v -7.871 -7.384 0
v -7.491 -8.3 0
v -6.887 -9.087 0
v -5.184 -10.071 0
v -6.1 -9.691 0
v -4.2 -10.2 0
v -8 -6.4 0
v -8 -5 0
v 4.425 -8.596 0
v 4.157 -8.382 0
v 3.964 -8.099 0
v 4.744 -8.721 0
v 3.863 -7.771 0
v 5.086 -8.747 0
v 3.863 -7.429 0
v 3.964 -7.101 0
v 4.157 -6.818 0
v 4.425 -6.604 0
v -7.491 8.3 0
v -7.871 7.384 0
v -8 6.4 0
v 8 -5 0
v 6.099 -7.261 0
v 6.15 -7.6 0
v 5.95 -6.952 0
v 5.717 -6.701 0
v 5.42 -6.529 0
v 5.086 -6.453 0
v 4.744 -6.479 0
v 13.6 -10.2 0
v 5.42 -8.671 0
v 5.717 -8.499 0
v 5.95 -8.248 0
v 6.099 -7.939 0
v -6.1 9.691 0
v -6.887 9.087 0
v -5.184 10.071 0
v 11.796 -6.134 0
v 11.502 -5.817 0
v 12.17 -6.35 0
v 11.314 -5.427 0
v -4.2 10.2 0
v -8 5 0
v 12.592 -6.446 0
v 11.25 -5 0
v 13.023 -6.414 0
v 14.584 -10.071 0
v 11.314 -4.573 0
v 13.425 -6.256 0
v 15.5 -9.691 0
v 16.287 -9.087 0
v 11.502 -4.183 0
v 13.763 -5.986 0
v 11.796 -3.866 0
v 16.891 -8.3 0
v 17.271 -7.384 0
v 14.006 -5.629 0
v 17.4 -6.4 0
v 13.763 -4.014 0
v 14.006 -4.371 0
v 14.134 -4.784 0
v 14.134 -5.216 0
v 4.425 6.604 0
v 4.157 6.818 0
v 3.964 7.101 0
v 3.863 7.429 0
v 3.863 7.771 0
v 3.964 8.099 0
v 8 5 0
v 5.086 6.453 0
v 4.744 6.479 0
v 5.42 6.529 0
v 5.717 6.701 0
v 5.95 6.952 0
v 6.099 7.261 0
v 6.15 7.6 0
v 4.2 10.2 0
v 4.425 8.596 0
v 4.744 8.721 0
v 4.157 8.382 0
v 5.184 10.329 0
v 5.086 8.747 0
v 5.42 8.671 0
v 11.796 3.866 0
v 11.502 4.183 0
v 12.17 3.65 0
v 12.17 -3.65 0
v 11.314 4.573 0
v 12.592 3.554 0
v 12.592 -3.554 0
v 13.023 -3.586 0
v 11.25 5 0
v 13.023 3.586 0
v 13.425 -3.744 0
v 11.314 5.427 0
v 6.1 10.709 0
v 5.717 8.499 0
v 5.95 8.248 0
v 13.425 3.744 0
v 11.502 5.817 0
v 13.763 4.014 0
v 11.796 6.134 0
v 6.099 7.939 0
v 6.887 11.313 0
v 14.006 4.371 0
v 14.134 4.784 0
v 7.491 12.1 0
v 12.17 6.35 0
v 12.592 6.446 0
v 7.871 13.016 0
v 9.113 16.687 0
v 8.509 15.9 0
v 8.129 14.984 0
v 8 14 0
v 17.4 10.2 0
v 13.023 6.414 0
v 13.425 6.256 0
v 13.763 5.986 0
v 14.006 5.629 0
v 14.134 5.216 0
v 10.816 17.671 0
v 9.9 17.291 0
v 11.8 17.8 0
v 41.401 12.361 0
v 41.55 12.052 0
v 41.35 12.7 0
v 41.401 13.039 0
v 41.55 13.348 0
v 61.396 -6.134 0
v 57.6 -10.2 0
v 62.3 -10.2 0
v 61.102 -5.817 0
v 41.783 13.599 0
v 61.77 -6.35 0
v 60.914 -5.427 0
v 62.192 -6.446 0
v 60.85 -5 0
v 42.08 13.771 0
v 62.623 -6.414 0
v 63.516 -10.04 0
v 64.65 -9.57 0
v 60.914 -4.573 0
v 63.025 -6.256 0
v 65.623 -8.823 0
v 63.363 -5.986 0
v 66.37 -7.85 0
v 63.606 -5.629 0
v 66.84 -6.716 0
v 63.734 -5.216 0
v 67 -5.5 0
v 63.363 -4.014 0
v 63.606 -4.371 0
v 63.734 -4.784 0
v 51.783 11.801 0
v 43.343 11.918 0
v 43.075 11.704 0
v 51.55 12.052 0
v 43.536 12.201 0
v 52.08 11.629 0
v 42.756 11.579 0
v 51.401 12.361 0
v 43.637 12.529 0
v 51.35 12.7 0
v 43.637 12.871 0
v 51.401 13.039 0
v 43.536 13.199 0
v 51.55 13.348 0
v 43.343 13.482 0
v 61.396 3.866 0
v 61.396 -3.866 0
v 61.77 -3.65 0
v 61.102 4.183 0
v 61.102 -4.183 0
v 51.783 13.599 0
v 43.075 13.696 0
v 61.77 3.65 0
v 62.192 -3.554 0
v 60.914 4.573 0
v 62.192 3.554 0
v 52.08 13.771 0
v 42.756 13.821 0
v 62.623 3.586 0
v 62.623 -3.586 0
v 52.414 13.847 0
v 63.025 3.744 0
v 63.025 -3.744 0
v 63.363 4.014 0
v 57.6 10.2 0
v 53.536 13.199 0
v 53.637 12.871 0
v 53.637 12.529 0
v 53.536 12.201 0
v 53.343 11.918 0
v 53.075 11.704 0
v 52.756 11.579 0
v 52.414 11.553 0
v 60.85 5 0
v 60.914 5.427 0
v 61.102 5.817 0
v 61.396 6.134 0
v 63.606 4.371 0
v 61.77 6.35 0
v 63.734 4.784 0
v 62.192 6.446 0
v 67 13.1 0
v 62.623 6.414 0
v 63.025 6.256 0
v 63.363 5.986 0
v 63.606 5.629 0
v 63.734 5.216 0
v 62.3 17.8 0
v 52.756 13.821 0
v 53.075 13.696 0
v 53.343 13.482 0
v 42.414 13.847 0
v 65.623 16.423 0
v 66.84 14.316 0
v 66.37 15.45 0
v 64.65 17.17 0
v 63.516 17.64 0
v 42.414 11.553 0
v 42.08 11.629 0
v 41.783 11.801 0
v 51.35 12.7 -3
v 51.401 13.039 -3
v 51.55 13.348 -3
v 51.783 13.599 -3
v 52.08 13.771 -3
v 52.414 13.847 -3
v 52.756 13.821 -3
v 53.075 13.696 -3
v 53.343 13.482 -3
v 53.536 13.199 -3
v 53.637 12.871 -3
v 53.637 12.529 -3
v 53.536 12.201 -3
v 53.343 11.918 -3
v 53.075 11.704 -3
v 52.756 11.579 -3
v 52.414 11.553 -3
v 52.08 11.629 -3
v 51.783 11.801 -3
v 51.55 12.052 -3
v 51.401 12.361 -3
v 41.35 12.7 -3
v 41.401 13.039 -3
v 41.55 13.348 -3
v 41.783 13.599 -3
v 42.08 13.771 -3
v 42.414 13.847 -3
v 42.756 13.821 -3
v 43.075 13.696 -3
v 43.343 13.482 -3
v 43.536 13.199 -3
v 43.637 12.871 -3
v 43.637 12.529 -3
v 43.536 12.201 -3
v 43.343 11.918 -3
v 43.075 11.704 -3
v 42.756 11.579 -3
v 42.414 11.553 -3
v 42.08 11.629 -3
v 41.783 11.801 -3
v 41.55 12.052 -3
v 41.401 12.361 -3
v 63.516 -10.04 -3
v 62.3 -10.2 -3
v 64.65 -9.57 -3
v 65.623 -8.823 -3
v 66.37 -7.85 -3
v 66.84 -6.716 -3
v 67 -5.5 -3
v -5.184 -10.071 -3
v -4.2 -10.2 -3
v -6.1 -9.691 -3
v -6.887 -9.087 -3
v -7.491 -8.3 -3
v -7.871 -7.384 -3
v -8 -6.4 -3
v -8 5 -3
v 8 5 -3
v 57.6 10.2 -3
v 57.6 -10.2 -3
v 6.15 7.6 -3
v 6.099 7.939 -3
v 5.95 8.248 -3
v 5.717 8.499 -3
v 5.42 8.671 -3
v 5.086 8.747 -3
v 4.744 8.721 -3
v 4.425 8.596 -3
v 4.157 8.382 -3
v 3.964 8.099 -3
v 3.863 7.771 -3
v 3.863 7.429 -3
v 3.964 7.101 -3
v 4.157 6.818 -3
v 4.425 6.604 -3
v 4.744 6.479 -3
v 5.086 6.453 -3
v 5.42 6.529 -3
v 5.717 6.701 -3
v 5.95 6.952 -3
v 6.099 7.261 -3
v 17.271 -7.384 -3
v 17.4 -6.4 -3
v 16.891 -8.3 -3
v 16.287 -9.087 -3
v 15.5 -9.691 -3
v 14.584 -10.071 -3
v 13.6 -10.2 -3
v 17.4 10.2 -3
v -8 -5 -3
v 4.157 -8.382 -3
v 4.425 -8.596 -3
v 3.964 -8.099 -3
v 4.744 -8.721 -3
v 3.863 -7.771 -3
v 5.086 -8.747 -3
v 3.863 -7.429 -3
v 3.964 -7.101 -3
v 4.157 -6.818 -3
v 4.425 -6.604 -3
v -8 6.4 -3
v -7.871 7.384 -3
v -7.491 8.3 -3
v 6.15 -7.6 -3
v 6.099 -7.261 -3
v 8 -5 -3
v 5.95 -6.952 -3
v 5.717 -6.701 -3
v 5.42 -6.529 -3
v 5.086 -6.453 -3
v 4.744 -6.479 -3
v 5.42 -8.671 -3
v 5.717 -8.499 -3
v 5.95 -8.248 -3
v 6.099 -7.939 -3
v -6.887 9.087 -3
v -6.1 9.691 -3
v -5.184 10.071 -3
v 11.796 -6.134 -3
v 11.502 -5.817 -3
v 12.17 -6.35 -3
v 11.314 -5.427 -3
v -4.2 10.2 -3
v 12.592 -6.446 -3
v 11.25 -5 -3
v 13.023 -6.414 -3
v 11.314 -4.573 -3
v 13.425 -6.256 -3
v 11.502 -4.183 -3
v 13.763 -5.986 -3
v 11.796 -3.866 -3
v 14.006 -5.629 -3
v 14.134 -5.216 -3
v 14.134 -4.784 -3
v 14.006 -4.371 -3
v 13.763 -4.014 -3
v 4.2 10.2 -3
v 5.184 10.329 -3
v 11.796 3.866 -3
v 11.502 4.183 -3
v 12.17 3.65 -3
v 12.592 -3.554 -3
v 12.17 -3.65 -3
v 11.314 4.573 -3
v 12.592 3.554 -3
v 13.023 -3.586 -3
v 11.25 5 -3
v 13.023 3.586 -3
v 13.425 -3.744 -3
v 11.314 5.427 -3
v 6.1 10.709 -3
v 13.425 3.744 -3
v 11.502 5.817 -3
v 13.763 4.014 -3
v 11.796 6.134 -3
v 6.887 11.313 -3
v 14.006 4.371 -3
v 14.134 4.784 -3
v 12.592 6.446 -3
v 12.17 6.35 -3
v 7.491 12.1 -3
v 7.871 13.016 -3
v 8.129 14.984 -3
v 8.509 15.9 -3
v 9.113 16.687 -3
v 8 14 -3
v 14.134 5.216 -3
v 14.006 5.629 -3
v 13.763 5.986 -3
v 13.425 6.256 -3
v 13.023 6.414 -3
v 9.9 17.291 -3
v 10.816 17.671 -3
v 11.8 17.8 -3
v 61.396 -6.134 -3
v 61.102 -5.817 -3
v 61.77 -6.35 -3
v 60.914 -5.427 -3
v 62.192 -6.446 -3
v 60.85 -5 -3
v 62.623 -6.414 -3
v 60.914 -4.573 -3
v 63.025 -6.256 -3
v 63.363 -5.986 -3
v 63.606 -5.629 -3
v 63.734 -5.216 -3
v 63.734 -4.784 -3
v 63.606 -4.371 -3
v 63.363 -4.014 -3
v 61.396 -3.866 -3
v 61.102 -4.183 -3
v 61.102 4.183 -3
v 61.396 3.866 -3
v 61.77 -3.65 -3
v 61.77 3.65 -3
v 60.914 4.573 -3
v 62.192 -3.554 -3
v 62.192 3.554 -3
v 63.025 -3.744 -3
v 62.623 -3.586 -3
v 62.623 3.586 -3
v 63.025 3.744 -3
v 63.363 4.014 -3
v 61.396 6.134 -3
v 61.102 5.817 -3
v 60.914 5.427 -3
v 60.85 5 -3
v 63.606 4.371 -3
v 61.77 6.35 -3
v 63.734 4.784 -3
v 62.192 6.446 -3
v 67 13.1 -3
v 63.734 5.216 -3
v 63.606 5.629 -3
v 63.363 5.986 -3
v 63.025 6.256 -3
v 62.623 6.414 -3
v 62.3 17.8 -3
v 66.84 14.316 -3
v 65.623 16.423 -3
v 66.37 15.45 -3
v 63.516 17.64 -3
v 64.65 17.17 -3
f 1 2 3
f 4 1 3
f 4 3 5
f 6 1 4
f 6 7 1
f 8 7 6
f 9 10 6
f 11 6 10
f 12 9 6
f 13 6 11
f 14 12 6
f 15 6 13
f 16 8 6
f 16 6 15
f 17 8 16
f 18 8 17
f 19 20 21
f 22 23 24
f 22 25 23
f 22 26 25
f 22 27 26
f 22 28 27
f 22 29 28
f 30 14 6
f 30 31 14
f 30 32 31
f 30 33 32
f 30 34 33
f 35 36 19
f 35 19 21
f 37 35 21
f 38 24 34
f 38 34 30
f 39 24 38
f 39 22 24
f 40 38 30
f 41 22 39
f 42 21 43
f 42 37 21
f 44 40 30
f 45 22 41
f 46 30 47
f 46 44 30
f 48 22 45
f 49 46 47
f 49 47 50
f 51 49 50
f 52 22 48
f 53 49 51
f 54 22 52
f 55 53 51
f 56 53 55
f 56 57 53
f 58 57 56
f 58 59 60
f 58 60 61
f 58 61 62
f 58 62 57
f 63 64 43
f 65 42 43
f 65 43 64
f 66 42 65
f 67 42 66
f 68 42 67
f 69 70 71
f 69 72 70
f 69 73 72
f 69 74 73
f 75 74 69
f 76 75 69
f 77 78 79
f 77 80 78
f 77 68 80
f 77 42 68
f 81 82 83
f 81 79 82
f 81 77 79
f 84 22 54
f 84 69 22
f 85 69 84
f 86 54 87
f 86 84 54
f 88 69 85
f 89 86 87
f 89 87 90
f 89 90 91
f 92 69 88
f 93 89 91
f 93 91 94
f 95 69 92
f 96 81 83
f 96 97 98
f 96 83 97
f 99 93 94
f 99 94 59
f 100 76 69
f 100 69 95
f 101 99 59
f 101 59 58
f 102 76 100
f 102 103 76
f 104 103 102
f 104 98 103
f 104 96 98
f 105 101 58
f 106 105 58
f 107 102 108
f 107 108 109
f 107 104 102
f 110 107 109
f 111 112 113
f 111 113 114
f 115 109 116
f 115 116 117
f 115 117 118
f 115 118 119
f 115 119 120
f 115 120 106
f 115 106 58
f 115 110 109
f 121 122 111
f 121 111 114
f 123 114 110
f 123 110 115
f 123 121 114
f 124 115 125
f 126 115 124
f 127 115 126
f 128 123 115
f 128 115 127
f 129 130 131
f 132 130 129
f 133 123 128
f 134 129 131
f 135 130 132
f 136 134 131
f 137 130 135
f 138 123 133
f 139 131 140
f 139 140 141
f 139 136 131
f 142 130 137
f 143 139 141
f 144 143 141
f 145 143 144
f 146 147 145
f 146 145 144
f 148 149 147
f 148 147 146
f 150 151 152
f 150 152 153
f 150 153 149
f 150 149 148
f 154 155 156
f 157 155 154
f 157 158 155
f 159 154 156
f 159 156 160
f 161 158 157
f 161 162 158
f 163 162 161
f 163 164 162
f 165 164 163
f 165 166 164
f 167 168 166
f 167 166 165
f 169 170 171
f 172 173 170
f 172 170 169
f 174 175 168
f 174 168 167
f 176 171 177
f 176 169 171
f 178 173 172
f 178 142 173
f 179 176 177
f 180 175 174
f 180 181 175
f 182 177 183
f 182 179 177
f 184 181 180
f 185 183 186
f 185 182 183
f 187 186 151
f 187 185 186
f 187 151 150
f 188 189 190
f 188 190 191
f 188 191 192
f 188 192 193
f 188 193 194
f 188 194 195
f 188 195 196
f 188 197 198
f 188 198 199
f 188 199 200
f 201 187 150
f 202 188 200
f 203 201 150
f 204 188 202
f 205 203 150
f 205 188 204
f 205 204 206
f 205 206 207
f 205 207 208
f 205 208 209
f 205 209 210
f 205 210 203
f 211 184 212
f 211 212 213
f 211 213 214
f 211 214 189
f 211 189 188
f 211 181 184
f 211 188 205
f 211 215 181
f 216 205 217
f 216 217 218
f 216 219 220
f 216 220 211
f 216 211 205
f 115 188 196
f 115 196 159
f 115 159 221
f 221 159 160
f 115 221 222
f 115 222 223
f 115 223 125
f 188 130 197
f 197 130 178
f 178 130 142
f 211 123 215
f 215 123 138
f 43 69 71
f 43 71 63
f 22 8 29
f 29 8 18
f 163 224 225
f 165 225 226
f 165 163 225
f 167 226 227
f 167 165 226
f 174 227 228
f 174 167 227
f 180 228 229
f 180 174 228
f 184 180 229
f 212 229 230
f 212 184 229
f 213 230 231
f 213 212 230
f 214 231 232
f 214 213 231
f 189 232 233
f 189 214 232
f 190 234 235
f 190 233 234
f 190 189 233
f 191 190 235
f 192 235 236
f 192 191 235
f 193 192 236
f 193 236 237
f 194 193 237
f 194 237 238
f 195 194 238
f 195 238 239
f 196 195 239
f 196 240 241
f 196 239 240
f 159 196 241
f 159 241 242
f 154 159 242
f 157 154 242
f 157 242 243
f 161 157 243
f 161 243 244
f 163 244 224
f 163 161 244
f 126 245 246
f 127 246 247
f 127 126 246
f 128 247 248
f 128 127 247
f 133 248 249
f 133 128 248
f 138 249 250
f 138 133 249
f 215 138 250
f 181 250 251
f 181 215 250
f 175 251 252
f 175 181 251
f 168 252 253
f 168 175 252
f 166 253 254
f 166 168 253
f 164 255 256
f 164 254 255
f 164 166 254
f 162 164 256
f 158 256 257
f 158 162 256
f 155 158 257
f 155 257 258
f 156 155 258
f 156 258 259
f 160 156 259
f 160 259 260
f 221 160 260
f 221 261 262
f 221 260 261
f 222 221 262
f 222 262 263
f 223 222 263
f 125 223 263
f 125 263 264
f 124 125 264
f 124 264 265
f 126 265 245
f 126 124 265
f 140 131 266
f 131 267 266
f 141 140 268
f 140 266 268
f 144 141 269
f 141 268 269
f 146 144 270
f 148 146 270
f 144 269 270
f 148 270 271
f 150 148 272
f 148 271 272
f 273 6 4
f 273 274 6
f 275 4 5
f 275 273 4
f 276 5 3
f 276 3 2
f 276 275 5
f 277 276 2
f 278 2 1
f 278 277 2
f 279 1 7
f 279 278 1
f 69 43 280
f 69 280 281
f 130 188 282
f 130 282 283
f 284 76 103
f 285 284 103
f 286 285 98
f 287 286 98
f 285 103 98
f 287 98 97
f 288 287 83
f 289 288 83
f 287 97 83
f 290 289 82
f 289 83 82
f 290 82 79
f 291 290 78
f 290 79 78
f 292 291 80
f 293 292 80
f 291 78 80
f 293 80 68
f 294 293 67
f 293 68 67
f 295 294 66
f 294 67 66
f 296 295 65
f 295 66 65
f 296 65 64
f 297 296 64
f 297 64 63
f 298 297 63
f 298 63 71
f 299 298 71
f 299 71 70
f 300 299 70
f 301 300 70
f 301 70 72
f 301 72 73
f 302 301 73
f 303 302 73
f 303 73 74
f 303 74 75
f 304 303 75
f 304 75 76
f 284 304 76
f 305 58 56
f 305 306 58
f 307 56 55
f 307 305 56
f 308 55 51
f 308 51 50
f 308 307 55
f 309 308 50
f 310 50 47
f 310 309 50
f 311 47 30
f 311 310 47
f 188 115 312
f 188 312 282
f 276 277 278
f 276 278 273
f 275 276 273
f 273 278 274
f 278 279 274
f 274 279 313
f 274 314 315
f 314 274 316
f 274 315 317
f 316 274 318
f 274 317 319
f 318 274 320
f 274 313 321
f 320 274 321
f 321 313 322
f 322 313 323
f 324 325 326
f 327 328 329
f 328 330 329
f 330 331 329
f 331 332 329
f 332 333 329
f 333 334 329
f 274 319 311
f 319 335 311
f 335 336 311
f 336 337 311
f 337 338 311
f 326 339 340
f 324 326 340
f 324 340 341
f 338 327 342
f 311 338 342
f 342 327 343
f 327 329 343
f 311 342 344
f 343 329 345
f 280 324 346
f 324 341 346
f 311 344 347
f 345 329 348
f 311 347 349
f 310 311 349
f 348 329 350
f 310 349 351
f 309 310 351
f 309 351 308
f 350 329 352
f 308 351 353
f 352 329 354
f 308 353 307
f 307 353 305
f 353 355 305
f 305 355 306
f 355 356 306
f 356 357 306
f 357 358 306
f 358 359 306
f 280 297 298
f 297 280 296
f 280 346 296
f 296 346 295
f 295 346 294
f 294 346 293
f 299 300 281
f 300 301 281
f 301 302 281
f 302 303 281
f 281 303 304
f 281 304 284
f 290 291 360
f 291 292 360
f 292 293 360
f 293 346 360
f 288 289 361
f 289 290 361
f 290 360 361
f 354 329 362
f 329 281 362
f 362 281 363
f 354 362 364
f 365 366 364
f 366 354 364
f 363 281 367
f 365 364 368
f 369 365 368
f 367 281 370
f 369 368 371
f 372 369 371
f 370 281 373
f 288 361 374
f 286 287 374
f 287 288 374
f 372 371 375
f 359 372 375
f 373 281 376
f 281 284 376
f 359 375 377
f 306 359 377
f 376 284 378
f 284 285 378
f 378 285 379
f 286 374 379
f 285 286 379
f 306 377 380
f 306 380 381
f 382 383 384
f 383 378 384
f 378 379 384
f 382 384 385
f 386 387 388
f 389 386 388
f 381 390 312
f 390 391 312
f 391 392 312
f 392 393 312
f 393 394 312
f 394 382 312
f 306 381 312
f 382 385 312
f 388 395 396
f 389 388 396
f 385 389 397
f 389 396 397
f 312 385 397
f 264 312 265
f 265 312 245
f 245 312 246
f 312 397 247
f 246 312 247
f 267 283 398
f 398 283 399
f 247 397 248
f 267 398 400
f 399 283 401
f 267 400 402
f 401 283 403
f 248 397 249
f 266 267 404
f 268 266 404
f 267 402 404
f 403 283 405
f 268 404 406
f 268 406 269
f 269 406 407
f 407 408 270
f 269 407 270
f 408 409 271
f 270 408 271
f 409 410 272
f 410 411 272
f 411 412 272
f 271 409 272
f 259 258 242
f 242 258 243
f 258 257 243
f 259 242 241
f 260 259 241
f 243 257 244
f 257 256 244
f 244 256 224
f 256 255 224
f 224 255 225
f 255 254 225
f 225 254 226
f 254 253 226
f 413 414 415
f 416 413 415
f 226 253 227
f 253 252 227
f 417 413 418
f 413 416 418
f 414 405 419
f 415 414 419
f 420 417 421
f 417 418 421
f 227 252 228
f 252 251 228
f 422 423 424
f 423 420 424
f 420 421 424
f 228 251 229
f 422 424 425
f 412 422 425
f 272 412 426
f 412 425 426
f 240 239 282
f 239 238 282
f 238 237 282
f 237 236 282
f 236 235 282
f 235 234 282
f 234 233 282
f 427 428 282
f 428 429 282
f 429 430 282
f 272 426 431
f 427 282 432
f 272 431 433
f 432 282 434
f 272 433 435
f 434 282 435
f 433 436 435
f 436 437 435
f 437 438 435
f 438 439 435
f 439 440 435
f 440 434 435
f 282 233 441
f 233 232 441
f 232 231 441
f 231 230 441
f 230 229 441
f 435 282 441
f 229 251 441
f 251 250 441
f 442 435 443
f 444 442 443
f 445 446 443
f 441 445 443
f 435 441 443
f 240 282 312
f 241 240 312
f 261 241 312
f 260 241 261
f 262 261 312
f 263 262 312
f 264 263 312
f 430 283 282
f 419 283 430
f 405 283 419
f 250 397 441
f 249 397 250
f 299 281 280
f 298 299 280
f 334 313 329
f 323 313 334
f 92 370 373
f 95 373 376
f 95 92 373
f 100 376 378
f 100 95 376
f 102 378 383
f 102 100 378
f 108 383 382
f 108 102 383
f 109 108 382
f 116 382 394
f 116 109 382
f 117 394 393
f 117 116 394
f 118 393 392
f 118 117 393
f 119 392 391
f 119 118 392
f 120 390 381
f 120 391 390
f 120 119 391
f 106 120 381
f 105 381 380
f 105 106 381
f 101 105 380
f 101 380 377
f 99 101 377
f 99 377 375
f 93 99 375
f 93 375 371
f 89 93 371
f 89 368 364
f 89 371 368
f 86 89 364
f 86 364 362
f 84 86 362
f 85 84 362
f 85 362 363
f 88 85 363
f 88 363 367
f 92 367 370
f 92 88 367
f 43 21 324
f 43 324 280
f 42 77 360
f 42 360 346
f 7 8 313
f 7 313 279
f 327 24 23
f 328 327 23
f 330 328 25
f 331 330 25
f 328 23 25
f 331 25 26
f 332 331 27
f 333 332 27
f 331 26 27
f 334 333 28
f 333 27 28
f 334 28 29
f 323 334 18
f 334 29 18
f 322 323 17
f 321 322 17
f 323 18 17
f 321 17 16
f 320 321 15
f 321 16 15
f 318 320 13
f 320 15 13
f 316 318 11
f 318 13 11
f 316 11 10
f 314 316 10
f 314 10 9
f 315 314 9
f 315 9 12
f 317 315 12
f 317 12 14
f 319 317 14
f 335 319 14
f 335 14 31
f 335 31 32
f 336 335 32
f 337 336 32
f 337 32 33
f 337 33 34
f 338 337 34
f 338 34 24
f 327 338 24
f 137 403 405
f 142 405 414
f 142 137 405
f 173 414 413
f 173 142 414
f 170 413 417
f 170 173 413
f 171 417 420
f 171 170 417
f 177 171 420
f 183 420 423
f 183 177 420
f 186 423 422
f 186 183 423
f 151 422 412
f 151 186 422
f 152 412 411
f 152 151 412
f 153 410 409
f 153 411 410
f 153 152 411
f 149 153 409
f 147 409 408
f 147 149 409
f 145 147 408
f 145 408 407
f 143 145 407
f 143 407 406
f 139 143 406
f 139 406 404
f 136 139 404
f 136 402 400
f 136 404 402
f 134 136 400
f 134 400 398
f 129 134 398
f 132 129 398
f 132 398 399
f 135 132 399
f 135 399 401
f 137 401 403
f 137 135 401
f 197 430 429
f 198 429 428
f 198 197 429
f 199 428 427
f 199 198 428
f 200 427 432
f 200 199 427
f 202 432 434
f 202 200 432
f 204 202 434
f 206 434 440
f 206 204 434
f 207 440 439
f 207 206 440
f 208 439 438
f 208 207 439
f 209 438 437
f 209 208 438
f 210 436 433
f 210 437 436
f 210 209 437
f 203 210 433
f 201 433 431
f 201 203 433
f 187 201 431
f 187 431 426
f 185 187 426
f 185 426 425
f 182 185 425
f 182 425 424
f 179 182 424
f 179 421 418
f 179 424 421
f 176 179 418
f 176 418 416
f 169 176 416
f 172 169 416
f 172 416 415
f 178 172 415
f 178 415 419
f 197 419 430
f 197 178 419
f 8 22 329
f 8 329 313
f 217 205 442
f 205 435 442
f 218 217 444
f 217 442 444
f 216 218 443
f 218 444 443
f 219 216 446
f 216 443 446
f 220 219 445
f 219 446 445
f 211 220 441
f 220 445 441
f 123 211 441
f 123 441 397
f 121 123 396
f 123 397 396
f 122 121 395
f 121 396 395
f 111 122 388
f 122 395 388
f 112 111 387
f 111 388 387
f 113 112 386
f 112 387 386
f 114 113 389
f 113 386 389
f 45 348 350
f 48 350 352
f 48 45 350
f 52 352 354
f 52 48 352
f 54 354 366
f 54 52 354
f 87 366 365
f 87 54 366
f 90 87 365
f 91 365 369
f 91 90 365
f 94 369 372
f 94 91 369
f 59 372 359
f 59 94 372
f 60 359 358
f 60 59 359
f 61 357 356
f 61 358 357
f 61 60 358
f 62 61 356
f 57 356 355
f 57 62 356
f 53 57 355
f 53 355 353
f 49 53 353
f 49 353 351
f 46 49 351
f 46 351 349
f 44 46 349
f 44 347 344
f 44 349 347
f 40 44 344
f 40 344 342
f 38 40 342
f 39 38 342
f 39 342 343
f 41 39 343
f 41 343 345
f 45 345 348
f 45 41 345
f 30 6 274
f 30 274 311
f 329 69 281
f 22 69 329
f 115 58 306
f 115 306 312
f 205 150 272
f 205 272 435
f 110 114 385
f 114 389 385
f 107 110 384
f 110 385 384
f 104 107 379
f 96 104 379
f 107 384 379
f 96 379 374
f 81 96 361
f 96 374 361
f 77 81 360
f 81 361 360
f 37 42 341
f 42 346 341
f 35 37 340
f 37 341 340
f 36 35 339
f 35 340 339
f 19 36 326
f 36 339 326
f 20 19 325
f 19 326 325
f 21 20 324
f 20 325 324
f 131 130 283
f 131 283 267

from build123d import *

# Parameters (mm, degrees)
BOSS_EXTRUDE7_DEPTH = 3
SKETCH12_R          = 1.15
CUT_EXTRUDE3_DEPTH  = 70.389048127
SKETCH11_R          = 1.45
CUT_EXTRUDE4_DEPTH  = 70.389048127
SKETCH13_R          = 1.15
CUT_EXTRUDE5_DEPTH  = 70.389048127
FILLET1_R           = 4.7
FILLET2_R           = 3.8


with BuildPart() as part:
    # Sketch10 → Boss-Extrude7 (new body)
    with BuildSketch(Plane.XY):
        Polygon((17.4, 10.2), (57.6, 10.2), (57.6, -10.2), (67, -10.2), (67, 17.8), (8, 17.8), (8, 10.2), (-8, 10.2), (-8, 5), (8, 5), (8, -5), (-8, -5), (-8, -10.2), (17.4, -10.2), align=None)
    extrude(amount=-BOSS_EXTRUDE7_DEPTH)

    # Sketch12 → Cut-Extrude3 (cut, through all)
    with BuildSketch(Plane(origin=(0, 0, 0), x_dir=(-1, 0, 0), z_dir=(0, 0, -1))):
        with Locations((-52.5, 12.7)):
            Circle(SKETCH12_R)
        with Locations((-42.5, 12.7)):
            Circle(SKETCH12_R)
    extrude(amount=CUT_EXTRUDE3_DEPTH, mode=Mode.SUBTRACT)

    # Sketch11 → Cut-Extrude4 (cut, through all)
    with BuildSketch(Plane(origin=(0, 0, 0), x_dir=(-1, 0, 0), z_dir=(0, 0, -1))):
        with Locations((-62.3, -5)):
            Circle(SKETCH11_R)
        with Locations((-12.7, -5)):
            Circle(SKETCH11_R)
        with Locations((-12.7, 5)):
            Circle(SKETCH11_R)
        with Locations((-62.3, 5)):
            Circle(SKETCH11_R)
    extrude(amount=CUT_EXTRUDE4_DEPTH, mode=Mode.SUBTRACT)

    # Sketch13 → Cut-Extrude5 (cut, through all)
    with BuildSketch(Plane.XY):
        with Locations((5, 7.6)):
            Circle(SKETCH13_R)
        with Locations((5, -7.6)):
            Circle(SKETCH13_R)
    extrude(amount=-CUT_EXTRUDE5_DEPTH, mode=Mode.SUBTRACT)

    # Fillet1
    fillet1_edges = [part.edges().sort_by_distance(p)[0] for p in [
        (67, 17.8, -1.5),
        (67, -10.2, -1.5),
    ]]
    fillet(fillet1_edges, radius=FILLET1_R)

    # Fillet2
    fillet2_edges = [part.edges().sort_by_distance(p)[0] for p in [
        (17.4, -10.2, -1.5),
        (-8, -10.2, -1.5),
        (8, 17.8, -1.5),
        (8, 10.2, -1.5),
        (-8, 10.2, -1.5),
    ]]
    fillet(fillet2_edges, radius=FILLET2_R - 0.0001)  # a hair under: the kernel refuses the full size


solid = part.part
